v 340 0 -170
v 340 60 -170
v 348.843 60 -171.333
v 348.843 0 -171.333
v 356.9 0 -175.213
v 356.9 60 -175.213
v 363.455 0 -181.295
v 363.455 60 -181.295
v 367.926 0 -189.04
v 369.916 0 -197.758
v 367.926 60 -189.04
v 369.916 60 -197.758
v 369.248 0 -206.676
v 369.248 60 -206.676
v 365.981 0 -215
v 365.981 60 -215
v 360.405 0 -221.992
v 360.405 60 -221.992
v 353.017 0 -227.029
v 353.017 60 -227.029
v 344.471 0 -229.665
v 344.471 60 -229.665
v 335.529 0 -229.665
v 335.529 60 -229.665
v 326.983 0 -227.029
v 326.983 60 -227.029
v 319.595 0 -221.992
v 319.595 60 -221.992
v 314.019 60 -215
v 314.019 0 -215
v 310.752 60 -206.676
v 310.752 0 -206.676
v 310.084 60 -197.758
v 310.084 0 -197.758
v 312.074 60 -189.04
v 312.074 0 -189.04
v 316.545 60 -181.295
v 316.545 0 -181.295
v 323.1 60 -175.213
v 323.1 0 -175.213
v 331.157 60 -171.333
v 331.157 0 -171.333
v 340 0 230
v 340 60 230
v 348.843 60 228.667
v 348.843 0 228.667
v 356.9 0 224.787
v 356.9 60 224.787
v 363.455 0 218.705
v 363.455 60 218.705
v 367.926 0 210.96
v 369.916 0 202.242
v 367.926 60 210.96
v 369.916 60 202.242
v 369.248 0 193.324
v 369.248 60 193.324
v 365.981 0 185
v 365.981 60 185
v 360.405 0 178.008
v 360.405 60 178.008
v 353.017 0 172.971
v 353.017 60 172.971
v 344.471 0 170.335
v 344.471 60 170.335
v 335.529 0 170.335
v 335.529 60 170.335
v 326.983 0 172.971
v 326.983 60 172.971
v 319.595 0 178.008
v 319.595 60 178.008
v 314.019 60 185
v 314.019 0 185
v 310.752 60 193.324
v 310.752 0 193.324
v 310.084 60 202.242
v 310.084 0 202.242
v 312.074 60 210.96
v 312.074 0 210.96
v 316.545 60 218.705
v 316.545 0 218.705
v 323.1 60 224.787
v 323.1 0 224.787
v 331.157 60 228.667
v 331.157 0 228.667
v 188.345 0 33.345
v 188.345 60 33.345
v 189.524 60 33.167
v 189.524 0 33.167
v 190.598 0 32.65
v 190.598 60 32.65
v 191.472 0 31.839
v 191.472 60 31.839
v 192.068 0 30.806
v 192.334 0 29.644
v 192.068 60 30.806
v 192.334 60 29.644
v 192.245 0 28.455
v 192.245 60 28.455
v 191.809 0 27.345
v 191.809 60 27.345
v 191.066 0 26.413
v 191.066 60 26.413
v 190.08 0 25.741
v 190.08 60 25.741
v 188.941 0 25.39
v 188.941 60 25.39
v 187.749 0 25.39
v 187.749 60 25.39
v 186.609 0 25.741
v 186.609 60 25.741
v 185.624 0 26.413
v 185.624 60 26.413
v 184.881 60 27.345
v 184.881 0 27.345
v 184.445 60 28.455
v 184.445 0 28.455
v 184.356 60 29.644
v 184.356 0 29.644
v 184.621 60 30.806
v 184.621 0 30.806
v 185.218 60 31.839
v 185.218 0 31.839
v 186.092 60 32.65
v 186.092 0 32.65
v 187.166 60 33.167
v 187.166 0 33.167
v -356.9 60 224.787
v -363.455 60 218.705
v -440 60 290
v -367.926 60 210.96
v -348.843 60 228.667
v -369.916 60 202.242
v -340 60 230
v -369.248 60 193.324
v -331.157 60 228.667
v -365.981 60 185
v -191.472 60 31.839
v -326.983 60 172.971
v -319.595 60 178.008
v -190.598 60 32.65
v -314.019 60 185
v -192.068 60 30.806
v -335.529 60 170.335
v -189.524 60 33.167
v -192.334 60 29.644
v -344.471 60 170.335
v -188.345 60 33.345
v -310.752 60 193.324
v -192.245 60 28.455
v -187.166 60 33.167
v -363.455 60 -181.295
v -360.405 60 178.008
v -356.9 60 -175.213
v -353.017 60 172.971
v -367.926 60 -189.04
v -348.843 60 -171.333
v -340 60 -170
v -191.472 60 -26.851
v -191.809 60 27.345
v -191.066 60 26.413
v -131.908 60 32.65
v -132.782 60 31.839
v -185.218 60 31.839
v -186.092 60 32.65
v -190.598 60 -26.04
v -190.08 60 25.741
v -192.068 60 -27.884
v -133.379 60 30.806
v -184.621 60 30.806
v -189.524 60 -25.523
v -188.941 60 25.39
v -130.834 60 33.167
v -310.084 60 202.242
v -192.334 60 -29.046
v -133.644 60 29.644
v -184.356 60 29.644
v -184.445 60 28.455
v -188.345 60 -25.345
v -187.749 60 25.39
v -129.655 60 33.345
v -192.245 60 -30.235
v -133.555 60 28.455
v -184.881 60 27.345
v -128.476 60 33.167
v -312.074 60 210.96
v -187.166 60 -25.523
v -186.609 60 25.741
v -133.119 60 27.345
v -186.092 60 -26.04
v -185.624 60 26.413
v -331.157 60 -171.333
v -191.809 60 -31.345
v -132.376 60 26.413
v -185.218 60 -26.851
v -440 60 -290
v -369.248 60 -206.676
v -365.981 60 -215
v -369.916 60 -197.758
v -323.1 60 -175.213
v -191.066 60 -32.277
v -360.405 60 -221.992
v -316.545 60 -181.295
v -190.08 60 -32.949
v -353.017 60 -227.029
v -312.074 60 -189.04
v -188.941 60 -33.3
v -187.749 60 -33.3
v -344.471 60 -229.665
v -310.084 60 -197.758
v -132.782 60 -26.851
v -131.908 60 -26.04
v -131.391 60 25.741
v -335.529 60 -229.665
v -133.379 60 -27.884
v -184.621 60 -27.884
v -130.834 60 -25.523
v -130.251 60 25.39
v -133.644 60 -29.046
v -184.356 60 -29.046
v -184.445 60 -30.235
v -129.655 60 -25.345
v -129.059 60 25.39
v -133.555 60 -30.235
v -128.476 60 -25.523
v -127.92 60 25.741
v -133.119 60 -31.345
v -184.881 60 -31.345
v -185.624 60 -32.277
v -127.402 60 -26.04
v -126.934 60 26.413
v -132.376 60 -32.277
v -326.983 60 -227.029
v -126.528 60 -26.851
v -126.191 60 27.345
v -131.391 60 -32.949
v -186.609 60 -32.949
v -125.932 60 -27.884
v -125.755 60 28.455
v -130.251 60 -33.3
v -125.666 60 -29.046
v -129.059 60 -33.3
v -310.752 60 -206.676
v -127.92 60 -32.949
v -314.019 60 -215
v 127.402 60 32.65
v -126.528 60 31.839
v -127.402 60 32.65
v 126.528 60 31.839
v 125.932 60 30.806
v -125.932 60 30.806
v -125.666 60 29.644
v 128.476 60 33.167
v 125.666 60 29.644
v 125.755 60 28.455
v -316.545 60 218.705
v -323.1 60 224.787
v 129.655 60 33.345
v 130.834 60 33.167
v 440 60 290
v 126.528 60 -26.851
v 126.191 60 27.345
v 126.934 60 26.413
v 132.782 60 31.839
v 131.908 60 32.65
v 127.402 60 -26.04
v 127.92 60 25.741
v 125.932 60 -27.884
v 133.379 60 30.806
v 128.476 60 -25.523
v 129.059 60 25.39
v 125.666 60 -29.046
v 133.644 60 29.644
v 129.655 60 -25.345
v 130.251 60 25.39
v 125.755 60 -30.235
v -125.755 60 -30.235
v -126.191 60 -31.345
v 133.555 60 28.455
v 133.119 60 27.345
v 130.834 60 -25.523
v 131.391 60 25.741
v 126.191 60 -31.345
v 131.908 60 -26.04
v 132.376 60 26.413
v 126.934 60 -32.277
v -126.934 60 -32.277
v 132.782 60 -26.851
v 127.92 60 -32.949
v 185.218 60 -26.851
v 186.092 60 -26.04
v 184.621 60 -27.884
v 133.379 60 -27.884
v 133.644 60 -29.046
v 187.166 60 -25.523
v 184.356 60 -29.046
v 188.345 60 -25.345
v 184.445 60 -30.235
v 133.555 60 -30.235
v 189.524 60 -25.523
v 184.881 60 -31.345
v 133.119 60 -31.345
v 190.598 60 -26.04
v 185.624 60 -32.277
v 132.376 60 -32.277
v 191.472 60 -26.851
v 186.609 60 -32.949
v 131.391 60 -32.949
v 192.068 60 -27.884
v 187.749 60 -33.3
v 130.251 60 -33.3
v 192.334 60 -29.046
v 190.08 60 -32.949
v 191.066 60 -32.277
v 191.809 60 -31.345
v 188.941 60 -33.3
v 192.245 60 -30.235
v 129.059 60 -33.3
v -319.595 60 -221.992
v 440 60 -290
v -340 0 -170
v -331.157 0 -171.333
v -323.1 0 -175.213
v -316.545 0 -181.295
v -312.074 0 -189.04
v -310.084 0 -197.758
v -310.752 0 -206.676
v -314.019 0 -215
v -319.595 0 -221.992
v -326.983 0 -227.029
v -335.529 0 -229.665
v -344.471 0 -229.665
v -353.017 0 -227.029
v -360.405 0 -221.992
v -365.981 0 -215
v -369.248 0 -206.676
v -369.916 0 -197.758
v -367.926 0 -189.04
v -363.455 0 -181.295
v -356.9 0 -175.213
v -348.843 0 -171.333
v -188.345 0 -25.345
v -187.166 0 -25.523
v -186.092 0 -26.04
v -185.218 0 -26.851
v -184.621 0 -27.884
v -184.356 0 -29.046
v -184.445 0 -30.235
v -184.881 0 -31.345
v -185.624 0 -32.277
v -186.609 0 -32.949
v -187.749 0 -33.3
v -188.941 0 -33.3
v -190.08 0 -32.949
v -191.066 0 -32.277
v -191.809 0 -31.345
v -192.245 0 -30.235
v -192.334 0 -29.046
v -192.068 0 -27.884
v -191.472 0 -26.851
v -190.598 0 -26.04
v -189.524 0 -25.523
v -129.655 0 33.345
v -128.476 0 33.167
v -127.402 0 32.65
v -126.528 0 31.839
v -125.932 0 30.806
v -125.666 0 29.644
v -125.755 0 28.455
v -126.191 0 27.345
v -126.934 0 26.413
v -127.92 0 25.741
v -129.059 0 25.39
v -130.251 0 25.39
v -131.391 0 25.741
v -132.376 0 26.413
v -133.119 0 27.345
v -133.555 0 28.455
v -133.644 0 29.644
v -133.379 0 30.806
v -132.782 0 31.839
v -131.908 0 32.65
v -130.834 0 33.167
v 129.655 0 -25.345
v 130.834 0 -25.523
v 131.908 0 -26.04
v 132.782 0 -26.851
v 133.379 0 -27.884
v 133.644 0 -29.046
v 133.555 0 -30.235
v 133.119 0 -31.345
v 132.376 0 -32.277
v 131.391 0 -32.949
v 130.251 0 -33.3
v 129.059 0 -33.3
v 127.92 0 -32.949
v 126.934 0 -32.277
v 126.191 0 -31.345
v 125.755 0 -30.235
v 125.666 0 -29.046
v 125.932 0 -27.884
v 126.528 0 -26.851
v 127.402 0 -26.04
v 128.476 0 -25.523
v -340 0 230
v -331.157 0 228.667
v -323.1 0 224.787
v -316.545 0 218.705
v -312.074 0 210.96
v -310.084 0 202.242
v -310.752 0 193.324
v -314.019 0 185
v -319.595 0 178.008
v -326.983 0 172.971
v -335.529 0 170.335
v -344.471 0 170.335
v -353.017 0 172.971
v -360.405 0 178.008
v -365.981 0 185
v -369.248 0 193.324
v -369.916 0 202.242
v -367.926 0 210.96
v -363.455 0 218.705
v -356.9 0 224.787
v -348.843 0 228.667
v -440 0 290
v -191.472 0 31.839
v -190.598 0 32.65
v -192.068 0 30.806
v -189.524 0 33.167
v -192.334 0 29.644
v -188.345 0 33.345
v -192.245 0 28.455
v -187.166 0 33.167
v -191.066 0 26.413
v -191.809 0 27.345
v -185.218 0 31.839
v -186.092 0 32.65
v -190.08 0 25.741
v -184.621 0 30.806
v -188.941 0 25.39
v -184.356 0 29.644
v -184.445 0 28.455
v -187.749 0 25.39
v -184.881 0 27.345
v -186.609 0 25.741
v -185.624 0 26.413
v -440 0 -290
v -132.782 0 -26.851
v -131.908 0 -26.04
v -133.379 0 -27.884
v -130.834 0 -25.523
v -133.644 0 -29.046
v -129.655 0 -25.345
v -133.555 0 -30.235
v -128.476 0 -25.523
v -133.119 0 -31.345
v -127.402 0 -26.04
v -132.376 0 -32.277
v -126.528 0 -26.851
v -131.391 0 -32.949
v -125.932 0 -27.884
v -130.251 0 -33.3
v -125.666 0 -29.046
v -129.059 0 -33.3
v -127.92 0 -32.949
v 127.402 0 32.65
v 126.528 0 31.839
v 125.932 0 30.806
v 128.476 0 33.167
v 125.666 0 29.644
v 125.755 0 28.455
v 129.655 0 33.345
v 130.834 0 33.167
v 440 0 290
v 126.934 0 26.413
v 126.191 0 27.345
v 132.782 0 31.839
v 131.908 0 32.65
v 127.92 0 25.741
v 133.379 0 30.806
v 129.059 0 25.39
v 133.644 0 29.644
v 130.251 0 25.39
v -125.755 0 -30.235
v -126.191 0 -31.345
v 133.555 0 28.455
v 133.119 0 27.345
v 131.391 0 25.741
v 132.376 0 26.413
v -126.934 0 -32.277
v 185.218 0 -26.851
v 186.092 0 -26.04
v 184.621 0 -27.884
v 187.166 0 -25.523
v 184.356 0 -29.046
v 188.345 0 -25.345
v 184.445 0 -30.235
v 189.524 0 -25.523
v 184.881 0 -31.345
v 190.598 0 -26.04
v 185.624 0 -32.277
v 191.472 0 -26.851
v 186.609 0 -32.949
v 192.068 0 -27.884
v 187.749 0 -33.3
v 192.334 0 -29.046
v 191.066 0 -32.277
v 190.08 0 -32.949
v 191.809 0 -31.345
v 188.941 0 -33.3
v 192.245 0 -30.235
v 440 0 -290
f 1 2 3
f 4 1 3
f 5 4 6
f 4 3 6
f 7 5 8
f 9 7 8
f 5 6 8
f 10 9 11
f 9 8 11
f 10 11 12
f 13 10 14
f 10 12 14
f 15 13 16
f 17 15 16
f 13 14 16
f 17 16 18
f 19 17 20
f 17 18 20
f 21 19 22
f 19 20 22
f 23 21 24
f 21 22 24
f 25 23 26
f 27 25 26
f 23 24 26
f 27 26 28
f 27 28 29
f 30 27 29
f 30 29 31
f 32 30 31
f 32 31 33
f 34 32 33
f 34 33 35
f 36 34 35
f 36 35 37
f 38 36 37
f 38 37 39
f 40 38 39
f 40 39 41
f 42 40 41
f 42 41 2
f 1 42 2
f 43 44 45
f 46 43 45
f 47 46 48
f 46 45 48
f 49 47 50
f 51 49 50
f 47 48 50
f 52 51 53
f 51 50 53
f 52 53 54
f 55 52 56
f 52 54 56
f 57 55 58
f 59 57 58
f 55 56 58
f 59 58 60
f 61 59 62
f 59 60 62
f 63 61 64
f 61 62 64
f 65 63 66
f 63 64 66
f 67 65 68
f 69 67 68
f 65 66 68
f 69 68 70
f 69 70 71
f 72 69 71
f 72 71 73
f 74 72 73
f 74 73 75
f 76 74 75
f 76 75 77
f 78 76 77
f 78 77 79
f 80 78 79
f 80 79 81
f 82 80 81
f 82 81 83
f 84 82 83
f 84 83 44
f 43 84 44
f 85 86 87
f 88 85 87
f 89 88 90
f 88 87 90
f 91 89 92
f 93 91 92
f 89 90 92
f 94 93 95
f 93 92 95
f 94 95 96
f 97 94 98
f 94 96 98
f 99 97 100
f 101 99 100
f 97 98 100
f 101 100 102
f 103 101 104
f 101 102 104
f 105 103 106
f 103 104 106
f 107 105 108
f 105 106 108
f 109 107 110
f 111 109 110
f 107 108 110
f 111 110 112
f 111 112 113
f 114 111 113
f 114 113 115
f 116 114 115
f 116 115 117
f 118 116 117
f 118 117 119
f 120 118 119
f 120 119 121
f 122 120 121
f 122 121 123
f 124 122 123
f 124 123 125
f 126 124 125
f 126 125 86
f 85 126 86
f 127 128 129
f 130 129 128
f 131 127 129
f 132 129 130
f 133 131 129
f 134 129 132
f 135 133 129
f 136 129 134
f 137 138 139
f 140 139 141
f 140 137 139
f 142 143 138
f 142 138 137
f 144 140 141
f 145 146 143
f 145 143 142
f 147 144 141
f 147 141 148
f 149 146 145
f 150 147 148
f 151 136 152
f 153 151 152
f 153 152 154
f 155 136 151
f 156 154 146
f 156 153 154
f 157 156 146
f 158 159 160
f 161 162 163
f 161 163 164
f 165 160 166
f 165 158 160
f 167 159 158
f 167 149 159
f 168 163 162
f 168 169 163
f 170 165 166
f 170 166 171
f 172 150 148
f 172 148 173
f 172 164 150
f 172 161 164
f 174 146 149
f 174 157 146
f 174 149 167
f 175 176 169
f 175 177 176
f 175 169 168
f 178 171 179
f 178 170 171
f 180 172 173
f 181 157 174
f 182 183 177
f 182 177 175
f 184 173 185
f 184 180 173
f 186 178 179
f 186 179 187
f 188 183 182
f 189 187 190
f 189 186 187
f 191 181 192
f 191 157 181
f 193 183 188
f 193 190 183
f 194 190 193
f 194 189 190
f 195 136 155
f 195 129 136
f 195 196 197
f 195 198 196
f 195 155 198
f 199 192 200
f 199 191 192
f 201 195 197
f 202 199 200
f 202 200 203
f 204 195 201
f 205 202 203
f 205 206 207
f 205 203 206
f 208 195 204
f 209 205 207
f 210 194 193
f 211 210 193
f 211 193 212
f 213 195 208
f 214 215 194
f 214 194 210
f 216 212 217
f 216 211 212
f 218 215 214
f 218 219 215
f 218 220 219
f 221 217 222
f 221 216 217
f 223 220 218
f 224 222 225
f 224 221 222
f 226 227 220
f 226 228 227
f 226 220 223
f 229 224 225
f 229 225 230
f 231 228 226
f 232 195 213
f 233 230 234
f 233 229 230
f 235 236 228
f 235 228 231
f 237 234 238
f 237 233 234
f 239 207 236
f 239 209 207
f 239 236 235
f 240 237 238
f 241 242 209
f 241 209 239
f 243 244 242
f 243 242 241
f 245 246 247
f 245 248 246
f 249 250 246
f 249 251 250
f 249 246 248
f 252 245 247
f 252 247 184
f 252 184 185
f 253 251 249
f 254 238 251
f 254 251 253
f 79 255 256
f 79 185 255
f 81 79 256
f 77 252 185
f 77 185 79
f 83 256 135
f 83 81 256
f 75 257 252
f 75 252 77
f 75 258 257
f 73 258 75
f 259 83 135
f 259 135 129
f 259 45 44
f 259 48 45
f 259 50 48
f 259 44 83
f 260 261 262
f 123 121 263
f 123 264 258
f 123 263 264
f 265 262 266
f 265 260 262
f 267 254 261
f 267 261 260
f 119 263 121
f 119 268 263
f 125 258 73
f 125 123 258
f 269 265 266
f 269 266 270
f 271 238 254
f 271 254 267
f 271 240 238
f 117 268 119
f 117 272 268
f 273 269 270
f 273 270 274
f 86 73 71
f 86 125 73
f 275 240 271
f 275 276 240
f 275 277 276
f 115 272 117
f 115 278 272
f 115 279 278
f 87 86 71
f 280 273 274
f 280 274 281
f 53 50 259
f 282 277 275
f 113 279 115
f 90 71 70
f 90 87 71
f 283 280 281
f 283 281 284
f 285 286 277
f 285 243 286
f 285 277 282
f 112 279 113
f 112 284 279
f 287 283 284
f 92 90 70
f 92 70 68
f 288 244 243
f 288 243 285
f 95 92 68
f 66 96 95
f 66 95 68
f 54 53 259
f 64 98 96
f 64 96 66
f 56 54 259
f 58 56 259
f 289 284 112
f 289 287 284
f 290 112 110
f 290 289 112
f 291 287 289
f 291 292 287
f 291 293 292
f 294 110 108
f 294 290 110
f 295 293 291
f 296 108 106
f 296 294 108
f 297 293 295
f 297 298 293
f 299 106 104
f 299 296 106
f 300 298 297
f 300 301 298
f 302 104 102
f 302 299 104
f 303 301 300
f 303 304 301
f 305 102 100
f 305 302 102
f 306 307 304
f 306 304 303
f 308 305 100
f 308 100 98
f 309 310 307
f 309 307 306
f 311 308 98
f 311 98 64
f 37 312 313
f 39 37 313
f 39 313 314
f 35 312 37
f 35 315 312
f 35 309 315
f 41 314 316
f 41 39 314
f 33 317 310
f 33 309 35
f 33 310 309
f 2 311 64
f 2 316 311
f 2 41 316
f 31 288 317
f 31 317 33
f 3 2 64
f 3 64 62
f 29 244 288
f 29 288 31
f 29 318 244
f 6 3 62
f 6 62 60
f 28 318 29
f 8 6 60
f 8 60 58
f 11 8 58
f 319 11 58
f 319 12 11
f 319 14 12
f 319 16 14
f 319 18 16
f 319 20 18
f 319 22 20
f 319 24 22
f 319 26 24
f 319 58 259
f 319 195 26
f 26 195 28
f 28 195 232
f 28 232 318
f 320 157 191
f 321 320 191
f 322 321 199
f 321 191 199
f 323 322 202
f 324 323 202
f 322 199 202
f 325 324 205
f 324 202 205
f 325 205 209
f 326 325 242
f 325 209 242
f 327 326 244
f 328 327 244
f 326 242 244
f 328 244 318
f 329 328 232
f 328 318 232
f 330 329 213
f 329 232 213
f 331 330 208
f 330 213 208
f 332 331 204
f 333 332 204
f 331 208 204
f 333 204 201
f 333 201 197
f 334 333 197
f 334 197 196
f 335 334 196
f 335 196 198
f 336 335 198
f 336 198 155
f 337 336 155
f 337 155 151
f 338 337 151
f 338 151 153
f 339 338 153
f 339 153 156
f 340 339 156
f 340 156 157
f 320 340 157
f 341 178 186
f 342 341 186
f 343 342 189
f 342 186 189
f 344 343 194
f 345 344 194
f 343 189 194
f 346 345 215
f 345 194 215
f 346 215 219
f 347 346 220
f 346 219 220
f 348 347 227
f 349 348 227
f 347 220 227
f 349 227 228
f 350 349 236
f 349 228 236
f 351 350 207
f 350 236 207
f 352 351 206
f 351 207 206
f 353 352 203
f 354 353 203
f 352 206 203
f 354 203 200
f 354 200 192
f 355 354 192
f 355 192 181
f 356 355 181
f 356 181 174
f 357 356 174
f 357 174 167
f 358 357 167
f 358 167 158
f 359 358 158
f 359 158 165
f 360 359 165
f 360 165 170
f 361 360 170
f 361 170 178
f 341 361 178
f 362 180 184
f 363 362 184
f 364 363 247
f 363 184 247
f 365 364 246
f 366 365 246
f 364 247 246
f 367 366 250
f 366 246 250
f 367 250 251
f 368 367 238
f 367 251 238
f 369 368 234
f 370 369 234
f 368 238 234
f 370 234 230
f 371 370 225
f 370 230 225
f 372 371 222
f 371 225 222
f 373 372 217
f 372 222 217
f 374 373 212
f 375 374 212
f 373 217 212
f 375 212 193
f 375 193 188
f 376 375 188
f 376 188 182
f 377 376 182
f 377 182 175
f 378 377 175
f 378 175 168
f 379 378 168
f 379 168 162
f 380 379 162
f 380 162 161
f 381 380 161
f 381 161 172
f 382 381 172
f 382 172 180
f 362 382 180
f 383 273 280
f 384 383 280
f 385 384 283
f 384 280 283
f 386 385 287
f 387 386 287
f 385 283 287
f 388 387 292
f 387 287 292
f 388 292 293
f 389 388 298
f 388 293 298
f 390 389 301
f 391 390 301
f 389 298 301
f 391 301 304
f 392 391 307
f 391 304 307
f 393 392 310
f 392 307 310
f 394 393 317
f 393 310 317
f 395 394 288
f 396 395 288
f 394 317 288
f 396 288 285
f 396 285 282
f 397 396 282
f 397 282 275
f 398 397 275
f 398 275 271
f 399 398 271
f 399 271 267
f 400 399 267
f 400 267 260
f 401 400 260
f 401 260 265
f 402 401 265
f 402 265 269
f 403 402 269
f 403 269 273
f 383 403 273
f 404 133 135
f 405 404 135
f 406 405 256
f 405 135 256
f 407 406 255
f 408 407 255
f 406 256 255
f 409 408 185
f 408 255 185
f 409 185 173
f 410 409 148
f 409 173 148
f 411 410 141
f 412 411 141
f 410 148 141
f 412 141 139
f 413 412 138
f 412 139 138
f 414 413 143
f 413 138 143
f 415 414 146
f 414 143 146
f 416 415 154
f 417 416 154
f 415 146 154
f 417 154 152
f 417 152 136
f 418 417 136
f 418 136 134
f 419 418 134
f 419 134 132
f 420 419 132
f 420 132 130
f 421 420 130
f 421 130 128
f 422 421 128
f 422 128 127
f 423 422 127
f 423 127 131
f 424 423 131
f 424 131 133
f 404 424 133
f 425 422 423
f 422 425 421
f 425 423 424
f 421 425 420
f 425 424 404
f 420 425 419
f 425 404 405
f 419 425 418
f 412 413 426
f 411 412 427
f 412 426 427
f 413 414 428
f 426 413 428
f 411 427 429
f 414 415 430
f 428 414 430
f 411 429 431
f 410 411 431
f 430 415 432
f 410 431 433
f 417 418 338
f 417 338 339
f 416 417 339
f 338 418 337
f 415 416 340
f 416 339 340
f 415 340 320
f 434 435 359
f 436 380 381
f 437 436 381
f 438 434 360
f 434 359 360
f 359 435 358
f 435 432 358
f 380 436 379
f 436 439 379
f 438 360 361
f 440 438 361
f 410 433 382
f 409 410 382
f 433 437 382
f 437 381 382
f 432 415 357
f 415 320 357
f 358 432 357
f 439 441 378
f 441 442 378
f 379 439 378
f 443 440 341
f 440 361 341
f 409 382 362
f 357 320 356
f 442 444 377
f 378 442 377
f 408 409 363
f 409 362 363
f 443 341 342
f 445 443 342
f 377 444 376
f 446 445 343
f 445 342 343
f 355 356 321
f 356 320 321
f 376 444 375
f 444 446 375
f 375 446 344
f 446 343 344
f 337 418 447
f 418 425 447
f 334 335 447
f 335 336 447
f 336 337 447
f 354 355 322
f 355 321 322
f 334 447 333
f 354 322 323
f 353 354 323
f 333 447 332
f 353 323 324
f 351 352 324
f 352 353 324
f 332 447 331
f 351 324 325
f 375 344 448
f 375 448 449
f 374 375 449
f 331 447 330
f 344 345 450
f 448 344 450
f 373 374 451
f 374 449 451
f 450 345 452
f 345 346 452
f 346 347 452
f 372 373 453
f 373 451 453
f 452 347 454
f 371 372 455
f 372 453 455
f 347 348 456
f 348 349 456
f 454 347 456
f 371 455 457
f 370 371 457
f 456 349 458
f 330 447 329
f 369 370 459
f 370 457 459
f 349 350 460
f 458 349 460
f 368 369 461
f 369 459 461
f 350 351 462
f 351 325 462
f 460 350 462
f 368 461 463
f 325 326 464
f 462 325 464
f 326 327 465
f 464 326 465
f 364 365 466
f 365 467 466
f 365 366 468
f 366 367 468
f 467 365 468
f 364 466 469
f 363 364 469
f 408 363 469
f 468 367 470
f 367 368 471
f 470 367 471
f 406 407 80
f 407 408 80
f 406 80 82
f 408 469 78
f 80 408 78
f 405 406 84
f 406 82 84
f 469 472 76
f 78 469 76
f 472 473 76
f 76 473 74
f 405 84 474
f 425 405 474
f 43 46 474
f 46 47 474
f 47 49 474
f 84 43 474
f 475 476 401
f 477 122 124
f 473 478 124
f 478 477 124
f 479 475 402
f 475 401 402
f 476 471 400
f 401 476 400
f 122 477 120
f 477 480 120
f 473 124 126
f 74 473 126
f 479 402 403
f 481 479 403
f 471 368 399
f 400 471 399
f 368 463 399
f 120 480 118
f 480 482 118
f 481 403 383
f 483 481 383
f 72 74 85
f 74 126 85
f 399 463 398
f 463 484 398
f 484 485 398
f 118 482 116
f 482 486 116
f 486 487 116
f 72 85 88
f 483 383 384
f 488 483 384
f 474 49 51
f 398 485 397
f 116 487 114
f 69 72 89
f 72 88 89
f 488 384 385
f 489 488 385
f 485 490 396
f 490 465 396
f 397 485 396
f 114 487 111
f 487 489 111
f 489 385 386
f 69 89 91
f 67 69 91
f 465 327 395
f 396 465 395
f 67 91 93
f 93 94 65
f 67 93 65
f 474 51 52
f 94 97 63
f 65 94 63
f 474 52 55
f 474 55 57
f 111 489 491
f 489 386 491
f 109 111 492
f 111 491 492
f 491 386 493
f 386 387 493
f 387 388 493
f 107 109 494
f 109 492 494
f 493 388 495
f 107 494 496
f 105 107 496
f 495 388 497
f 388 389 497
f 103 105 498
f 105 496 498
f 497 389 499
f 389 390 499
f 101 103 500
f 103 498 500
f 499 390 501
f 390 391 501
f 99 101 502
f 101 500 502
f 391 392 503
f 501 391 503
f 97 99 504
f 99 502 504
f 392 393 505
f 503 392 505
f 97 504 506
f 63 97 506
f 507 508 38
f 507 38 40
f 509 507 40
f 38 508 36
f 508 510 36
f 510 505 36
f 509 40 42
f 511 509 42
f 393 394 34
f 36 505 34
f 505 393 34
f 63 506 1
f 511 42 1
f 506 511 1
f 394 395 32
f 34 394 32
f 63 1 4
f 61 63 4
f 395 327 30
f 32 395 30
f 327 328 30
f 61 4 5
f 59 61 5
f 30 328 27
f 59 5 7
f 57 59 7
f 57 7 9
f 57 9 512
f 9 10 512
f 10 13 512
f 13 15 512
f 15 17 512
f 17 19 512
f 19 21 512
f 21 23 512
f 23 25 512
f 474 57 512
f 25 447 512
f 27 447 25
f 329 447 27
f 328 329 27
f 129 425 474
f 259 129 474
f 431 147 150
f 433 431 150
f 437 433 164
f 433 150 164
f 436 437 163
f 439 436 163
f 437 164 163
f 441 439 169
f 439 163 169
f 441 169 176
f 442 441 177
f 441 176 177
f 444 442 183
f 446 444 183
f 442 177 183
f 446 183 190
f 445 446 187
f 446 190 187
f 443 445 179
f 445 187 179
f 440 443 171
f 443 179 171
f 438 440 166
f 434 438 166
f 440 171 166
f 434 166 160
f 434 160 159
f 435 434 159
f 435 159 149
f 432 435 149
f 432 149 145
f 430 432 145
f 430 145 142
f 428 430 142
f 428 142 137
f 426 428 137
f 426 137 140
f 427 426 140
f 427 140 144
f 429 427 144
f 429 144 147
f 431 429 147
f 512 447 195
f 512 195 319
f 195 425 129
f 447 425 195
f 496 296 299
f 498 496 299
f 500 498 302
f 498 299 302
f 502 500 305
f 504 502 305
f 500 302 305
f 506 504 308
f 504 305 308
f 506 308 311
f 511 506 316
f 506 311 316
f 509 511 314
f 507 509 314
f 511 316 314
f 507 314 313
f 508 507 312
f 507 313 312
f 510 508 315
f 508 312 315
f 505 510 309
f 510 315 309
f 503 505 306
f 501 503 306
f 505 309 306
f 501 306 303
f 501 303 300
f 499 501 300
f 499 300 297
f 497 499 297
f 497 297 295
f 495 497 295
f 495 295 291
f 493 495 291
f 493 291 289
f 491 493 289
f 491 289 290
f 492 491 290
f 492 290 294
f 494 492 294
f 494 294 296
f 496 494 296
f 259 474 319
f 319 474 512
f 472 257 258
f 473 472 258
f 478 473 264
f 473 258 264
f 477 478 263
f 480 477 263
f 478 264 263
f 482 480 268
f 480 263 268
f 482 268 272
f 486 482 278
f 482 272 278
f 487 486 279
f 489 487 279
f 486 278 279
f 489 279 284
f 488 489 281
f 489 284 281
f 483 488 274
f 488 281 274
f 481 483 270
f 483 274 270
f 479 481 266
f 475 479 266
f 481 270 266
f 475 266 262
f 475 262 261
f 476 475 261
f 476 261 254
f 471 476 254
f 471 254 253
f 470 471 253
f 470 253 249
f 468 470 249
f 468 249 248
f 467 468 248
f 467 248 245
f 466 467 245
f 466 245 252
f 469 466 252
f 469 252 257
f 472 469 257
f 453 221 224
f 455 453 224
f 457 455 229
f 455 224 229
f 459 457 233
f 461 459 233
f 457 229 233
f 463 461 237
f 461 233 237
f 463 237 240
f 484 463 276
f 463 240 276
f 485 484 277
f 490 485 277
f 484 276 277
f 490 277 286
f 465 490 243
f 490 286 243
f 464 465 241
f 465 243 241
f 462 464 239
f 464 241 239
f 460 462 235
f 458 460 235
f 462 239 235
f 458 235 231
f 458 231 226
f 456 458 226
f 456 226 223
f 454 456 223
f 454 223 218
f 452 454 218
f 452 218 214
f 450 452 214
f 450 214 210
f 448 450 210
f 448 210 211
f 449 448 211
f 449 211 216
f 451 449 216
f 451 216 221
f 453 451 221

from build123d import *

# Parameters (mm, degrees)
SKETCH1_W           = 880
SKETCH1_H           = 580
BOSS_EXTRUDE1_DEPTH = 60
SKETCH2_R           = 30
CUT_EXTRUDE1_DEPTH  = 260
SKETCH4_R           = 4
CUT_EXTRUDE3_DEPTH  = 260


with BuildPart() as part:
    # Sketch1 → Boss-Extrude1 (new body)
    with BuildSketch(Plane(origin=(0, 0, 0), x_dir=(1, 0, 0), z_dir=(0, 1, 0))):
        Rectangle(SKETCH1_W, SKETCH1_H)
    extrude(amount=BOSS_EXTRUDE1_DEPTH)

    # Sketch2 → Cut-Extrude1 (cut)
    with BuildSketch(Plane(origin=(0, 60, 0), x_dir=(1, 0, 0), z_dir=(0, 1, 0))):
        with Locations(Location((-340, 200, 0), (0, 0, 270))):
            Circle(SKETCH2_R)
        with Locations(Location((340, 200, 0), (0, 0, 270))):
            Circle(SKETCH2_R)
        with Locations(Location((340, -200, 0), (0, 0, 270))):
            Circle(SKETCH2_R)
        with Locations(Location((-340, -200, 0), (0, 0, 270))):
            Circle(SKETCH2_R)
    extrude(amount=-CUT_EXTRUDE1_DEPTH, mode=Mode.SUBTRACT)

    # Sketch4 → Cut-Extrude3 (cut)
    with BuildSketch(Plane(origin=(0, 60, 0), x_dir=(1, 0, 0), z_dir=(0, 1, 0))):
        with Locations(Location((-129.655068581, 29.344931419, 0), (0, 0, 270))):
            Circle(SKETCH4_R)
        with Locations(Location((-129.655068581, -29.344931419, 0), (0, 0, 270))):
            Circle(SKETCH4_R)
        with Locations(Location((-188.344931419, -29.344931419, 0), (0, 0, 270))):
            Circle(SKETCH4_R)
        with Locations(Location((-188.344931419, 29.344931419, 0), (0, 0, 270))):
            Circle(SKETCH4_R)
        with Locations(Location((188.344931419, 29.344931419, 0), (0, 0, 270))):
            Circle(SKETCH4_R)
        with Locations(Location((188.344931419, -29.344931419, 0), (0, 0, 270))):
            Circle(SKETCH4_R)
        with Locations(Location((129.655068581, -29.344931419, 0), (0, 0, 270))):
            Circle(SKETCH4_R)
        with Locations(Location((129.655068581, 29.344931419, 0), (0, 0, 270))):
            Circle(SKETCH4_R)
    extrude(amount=-CUT_EXTRUDE3_DEPTH, mode=Mode.SUBTRACT)


solid = part.part
